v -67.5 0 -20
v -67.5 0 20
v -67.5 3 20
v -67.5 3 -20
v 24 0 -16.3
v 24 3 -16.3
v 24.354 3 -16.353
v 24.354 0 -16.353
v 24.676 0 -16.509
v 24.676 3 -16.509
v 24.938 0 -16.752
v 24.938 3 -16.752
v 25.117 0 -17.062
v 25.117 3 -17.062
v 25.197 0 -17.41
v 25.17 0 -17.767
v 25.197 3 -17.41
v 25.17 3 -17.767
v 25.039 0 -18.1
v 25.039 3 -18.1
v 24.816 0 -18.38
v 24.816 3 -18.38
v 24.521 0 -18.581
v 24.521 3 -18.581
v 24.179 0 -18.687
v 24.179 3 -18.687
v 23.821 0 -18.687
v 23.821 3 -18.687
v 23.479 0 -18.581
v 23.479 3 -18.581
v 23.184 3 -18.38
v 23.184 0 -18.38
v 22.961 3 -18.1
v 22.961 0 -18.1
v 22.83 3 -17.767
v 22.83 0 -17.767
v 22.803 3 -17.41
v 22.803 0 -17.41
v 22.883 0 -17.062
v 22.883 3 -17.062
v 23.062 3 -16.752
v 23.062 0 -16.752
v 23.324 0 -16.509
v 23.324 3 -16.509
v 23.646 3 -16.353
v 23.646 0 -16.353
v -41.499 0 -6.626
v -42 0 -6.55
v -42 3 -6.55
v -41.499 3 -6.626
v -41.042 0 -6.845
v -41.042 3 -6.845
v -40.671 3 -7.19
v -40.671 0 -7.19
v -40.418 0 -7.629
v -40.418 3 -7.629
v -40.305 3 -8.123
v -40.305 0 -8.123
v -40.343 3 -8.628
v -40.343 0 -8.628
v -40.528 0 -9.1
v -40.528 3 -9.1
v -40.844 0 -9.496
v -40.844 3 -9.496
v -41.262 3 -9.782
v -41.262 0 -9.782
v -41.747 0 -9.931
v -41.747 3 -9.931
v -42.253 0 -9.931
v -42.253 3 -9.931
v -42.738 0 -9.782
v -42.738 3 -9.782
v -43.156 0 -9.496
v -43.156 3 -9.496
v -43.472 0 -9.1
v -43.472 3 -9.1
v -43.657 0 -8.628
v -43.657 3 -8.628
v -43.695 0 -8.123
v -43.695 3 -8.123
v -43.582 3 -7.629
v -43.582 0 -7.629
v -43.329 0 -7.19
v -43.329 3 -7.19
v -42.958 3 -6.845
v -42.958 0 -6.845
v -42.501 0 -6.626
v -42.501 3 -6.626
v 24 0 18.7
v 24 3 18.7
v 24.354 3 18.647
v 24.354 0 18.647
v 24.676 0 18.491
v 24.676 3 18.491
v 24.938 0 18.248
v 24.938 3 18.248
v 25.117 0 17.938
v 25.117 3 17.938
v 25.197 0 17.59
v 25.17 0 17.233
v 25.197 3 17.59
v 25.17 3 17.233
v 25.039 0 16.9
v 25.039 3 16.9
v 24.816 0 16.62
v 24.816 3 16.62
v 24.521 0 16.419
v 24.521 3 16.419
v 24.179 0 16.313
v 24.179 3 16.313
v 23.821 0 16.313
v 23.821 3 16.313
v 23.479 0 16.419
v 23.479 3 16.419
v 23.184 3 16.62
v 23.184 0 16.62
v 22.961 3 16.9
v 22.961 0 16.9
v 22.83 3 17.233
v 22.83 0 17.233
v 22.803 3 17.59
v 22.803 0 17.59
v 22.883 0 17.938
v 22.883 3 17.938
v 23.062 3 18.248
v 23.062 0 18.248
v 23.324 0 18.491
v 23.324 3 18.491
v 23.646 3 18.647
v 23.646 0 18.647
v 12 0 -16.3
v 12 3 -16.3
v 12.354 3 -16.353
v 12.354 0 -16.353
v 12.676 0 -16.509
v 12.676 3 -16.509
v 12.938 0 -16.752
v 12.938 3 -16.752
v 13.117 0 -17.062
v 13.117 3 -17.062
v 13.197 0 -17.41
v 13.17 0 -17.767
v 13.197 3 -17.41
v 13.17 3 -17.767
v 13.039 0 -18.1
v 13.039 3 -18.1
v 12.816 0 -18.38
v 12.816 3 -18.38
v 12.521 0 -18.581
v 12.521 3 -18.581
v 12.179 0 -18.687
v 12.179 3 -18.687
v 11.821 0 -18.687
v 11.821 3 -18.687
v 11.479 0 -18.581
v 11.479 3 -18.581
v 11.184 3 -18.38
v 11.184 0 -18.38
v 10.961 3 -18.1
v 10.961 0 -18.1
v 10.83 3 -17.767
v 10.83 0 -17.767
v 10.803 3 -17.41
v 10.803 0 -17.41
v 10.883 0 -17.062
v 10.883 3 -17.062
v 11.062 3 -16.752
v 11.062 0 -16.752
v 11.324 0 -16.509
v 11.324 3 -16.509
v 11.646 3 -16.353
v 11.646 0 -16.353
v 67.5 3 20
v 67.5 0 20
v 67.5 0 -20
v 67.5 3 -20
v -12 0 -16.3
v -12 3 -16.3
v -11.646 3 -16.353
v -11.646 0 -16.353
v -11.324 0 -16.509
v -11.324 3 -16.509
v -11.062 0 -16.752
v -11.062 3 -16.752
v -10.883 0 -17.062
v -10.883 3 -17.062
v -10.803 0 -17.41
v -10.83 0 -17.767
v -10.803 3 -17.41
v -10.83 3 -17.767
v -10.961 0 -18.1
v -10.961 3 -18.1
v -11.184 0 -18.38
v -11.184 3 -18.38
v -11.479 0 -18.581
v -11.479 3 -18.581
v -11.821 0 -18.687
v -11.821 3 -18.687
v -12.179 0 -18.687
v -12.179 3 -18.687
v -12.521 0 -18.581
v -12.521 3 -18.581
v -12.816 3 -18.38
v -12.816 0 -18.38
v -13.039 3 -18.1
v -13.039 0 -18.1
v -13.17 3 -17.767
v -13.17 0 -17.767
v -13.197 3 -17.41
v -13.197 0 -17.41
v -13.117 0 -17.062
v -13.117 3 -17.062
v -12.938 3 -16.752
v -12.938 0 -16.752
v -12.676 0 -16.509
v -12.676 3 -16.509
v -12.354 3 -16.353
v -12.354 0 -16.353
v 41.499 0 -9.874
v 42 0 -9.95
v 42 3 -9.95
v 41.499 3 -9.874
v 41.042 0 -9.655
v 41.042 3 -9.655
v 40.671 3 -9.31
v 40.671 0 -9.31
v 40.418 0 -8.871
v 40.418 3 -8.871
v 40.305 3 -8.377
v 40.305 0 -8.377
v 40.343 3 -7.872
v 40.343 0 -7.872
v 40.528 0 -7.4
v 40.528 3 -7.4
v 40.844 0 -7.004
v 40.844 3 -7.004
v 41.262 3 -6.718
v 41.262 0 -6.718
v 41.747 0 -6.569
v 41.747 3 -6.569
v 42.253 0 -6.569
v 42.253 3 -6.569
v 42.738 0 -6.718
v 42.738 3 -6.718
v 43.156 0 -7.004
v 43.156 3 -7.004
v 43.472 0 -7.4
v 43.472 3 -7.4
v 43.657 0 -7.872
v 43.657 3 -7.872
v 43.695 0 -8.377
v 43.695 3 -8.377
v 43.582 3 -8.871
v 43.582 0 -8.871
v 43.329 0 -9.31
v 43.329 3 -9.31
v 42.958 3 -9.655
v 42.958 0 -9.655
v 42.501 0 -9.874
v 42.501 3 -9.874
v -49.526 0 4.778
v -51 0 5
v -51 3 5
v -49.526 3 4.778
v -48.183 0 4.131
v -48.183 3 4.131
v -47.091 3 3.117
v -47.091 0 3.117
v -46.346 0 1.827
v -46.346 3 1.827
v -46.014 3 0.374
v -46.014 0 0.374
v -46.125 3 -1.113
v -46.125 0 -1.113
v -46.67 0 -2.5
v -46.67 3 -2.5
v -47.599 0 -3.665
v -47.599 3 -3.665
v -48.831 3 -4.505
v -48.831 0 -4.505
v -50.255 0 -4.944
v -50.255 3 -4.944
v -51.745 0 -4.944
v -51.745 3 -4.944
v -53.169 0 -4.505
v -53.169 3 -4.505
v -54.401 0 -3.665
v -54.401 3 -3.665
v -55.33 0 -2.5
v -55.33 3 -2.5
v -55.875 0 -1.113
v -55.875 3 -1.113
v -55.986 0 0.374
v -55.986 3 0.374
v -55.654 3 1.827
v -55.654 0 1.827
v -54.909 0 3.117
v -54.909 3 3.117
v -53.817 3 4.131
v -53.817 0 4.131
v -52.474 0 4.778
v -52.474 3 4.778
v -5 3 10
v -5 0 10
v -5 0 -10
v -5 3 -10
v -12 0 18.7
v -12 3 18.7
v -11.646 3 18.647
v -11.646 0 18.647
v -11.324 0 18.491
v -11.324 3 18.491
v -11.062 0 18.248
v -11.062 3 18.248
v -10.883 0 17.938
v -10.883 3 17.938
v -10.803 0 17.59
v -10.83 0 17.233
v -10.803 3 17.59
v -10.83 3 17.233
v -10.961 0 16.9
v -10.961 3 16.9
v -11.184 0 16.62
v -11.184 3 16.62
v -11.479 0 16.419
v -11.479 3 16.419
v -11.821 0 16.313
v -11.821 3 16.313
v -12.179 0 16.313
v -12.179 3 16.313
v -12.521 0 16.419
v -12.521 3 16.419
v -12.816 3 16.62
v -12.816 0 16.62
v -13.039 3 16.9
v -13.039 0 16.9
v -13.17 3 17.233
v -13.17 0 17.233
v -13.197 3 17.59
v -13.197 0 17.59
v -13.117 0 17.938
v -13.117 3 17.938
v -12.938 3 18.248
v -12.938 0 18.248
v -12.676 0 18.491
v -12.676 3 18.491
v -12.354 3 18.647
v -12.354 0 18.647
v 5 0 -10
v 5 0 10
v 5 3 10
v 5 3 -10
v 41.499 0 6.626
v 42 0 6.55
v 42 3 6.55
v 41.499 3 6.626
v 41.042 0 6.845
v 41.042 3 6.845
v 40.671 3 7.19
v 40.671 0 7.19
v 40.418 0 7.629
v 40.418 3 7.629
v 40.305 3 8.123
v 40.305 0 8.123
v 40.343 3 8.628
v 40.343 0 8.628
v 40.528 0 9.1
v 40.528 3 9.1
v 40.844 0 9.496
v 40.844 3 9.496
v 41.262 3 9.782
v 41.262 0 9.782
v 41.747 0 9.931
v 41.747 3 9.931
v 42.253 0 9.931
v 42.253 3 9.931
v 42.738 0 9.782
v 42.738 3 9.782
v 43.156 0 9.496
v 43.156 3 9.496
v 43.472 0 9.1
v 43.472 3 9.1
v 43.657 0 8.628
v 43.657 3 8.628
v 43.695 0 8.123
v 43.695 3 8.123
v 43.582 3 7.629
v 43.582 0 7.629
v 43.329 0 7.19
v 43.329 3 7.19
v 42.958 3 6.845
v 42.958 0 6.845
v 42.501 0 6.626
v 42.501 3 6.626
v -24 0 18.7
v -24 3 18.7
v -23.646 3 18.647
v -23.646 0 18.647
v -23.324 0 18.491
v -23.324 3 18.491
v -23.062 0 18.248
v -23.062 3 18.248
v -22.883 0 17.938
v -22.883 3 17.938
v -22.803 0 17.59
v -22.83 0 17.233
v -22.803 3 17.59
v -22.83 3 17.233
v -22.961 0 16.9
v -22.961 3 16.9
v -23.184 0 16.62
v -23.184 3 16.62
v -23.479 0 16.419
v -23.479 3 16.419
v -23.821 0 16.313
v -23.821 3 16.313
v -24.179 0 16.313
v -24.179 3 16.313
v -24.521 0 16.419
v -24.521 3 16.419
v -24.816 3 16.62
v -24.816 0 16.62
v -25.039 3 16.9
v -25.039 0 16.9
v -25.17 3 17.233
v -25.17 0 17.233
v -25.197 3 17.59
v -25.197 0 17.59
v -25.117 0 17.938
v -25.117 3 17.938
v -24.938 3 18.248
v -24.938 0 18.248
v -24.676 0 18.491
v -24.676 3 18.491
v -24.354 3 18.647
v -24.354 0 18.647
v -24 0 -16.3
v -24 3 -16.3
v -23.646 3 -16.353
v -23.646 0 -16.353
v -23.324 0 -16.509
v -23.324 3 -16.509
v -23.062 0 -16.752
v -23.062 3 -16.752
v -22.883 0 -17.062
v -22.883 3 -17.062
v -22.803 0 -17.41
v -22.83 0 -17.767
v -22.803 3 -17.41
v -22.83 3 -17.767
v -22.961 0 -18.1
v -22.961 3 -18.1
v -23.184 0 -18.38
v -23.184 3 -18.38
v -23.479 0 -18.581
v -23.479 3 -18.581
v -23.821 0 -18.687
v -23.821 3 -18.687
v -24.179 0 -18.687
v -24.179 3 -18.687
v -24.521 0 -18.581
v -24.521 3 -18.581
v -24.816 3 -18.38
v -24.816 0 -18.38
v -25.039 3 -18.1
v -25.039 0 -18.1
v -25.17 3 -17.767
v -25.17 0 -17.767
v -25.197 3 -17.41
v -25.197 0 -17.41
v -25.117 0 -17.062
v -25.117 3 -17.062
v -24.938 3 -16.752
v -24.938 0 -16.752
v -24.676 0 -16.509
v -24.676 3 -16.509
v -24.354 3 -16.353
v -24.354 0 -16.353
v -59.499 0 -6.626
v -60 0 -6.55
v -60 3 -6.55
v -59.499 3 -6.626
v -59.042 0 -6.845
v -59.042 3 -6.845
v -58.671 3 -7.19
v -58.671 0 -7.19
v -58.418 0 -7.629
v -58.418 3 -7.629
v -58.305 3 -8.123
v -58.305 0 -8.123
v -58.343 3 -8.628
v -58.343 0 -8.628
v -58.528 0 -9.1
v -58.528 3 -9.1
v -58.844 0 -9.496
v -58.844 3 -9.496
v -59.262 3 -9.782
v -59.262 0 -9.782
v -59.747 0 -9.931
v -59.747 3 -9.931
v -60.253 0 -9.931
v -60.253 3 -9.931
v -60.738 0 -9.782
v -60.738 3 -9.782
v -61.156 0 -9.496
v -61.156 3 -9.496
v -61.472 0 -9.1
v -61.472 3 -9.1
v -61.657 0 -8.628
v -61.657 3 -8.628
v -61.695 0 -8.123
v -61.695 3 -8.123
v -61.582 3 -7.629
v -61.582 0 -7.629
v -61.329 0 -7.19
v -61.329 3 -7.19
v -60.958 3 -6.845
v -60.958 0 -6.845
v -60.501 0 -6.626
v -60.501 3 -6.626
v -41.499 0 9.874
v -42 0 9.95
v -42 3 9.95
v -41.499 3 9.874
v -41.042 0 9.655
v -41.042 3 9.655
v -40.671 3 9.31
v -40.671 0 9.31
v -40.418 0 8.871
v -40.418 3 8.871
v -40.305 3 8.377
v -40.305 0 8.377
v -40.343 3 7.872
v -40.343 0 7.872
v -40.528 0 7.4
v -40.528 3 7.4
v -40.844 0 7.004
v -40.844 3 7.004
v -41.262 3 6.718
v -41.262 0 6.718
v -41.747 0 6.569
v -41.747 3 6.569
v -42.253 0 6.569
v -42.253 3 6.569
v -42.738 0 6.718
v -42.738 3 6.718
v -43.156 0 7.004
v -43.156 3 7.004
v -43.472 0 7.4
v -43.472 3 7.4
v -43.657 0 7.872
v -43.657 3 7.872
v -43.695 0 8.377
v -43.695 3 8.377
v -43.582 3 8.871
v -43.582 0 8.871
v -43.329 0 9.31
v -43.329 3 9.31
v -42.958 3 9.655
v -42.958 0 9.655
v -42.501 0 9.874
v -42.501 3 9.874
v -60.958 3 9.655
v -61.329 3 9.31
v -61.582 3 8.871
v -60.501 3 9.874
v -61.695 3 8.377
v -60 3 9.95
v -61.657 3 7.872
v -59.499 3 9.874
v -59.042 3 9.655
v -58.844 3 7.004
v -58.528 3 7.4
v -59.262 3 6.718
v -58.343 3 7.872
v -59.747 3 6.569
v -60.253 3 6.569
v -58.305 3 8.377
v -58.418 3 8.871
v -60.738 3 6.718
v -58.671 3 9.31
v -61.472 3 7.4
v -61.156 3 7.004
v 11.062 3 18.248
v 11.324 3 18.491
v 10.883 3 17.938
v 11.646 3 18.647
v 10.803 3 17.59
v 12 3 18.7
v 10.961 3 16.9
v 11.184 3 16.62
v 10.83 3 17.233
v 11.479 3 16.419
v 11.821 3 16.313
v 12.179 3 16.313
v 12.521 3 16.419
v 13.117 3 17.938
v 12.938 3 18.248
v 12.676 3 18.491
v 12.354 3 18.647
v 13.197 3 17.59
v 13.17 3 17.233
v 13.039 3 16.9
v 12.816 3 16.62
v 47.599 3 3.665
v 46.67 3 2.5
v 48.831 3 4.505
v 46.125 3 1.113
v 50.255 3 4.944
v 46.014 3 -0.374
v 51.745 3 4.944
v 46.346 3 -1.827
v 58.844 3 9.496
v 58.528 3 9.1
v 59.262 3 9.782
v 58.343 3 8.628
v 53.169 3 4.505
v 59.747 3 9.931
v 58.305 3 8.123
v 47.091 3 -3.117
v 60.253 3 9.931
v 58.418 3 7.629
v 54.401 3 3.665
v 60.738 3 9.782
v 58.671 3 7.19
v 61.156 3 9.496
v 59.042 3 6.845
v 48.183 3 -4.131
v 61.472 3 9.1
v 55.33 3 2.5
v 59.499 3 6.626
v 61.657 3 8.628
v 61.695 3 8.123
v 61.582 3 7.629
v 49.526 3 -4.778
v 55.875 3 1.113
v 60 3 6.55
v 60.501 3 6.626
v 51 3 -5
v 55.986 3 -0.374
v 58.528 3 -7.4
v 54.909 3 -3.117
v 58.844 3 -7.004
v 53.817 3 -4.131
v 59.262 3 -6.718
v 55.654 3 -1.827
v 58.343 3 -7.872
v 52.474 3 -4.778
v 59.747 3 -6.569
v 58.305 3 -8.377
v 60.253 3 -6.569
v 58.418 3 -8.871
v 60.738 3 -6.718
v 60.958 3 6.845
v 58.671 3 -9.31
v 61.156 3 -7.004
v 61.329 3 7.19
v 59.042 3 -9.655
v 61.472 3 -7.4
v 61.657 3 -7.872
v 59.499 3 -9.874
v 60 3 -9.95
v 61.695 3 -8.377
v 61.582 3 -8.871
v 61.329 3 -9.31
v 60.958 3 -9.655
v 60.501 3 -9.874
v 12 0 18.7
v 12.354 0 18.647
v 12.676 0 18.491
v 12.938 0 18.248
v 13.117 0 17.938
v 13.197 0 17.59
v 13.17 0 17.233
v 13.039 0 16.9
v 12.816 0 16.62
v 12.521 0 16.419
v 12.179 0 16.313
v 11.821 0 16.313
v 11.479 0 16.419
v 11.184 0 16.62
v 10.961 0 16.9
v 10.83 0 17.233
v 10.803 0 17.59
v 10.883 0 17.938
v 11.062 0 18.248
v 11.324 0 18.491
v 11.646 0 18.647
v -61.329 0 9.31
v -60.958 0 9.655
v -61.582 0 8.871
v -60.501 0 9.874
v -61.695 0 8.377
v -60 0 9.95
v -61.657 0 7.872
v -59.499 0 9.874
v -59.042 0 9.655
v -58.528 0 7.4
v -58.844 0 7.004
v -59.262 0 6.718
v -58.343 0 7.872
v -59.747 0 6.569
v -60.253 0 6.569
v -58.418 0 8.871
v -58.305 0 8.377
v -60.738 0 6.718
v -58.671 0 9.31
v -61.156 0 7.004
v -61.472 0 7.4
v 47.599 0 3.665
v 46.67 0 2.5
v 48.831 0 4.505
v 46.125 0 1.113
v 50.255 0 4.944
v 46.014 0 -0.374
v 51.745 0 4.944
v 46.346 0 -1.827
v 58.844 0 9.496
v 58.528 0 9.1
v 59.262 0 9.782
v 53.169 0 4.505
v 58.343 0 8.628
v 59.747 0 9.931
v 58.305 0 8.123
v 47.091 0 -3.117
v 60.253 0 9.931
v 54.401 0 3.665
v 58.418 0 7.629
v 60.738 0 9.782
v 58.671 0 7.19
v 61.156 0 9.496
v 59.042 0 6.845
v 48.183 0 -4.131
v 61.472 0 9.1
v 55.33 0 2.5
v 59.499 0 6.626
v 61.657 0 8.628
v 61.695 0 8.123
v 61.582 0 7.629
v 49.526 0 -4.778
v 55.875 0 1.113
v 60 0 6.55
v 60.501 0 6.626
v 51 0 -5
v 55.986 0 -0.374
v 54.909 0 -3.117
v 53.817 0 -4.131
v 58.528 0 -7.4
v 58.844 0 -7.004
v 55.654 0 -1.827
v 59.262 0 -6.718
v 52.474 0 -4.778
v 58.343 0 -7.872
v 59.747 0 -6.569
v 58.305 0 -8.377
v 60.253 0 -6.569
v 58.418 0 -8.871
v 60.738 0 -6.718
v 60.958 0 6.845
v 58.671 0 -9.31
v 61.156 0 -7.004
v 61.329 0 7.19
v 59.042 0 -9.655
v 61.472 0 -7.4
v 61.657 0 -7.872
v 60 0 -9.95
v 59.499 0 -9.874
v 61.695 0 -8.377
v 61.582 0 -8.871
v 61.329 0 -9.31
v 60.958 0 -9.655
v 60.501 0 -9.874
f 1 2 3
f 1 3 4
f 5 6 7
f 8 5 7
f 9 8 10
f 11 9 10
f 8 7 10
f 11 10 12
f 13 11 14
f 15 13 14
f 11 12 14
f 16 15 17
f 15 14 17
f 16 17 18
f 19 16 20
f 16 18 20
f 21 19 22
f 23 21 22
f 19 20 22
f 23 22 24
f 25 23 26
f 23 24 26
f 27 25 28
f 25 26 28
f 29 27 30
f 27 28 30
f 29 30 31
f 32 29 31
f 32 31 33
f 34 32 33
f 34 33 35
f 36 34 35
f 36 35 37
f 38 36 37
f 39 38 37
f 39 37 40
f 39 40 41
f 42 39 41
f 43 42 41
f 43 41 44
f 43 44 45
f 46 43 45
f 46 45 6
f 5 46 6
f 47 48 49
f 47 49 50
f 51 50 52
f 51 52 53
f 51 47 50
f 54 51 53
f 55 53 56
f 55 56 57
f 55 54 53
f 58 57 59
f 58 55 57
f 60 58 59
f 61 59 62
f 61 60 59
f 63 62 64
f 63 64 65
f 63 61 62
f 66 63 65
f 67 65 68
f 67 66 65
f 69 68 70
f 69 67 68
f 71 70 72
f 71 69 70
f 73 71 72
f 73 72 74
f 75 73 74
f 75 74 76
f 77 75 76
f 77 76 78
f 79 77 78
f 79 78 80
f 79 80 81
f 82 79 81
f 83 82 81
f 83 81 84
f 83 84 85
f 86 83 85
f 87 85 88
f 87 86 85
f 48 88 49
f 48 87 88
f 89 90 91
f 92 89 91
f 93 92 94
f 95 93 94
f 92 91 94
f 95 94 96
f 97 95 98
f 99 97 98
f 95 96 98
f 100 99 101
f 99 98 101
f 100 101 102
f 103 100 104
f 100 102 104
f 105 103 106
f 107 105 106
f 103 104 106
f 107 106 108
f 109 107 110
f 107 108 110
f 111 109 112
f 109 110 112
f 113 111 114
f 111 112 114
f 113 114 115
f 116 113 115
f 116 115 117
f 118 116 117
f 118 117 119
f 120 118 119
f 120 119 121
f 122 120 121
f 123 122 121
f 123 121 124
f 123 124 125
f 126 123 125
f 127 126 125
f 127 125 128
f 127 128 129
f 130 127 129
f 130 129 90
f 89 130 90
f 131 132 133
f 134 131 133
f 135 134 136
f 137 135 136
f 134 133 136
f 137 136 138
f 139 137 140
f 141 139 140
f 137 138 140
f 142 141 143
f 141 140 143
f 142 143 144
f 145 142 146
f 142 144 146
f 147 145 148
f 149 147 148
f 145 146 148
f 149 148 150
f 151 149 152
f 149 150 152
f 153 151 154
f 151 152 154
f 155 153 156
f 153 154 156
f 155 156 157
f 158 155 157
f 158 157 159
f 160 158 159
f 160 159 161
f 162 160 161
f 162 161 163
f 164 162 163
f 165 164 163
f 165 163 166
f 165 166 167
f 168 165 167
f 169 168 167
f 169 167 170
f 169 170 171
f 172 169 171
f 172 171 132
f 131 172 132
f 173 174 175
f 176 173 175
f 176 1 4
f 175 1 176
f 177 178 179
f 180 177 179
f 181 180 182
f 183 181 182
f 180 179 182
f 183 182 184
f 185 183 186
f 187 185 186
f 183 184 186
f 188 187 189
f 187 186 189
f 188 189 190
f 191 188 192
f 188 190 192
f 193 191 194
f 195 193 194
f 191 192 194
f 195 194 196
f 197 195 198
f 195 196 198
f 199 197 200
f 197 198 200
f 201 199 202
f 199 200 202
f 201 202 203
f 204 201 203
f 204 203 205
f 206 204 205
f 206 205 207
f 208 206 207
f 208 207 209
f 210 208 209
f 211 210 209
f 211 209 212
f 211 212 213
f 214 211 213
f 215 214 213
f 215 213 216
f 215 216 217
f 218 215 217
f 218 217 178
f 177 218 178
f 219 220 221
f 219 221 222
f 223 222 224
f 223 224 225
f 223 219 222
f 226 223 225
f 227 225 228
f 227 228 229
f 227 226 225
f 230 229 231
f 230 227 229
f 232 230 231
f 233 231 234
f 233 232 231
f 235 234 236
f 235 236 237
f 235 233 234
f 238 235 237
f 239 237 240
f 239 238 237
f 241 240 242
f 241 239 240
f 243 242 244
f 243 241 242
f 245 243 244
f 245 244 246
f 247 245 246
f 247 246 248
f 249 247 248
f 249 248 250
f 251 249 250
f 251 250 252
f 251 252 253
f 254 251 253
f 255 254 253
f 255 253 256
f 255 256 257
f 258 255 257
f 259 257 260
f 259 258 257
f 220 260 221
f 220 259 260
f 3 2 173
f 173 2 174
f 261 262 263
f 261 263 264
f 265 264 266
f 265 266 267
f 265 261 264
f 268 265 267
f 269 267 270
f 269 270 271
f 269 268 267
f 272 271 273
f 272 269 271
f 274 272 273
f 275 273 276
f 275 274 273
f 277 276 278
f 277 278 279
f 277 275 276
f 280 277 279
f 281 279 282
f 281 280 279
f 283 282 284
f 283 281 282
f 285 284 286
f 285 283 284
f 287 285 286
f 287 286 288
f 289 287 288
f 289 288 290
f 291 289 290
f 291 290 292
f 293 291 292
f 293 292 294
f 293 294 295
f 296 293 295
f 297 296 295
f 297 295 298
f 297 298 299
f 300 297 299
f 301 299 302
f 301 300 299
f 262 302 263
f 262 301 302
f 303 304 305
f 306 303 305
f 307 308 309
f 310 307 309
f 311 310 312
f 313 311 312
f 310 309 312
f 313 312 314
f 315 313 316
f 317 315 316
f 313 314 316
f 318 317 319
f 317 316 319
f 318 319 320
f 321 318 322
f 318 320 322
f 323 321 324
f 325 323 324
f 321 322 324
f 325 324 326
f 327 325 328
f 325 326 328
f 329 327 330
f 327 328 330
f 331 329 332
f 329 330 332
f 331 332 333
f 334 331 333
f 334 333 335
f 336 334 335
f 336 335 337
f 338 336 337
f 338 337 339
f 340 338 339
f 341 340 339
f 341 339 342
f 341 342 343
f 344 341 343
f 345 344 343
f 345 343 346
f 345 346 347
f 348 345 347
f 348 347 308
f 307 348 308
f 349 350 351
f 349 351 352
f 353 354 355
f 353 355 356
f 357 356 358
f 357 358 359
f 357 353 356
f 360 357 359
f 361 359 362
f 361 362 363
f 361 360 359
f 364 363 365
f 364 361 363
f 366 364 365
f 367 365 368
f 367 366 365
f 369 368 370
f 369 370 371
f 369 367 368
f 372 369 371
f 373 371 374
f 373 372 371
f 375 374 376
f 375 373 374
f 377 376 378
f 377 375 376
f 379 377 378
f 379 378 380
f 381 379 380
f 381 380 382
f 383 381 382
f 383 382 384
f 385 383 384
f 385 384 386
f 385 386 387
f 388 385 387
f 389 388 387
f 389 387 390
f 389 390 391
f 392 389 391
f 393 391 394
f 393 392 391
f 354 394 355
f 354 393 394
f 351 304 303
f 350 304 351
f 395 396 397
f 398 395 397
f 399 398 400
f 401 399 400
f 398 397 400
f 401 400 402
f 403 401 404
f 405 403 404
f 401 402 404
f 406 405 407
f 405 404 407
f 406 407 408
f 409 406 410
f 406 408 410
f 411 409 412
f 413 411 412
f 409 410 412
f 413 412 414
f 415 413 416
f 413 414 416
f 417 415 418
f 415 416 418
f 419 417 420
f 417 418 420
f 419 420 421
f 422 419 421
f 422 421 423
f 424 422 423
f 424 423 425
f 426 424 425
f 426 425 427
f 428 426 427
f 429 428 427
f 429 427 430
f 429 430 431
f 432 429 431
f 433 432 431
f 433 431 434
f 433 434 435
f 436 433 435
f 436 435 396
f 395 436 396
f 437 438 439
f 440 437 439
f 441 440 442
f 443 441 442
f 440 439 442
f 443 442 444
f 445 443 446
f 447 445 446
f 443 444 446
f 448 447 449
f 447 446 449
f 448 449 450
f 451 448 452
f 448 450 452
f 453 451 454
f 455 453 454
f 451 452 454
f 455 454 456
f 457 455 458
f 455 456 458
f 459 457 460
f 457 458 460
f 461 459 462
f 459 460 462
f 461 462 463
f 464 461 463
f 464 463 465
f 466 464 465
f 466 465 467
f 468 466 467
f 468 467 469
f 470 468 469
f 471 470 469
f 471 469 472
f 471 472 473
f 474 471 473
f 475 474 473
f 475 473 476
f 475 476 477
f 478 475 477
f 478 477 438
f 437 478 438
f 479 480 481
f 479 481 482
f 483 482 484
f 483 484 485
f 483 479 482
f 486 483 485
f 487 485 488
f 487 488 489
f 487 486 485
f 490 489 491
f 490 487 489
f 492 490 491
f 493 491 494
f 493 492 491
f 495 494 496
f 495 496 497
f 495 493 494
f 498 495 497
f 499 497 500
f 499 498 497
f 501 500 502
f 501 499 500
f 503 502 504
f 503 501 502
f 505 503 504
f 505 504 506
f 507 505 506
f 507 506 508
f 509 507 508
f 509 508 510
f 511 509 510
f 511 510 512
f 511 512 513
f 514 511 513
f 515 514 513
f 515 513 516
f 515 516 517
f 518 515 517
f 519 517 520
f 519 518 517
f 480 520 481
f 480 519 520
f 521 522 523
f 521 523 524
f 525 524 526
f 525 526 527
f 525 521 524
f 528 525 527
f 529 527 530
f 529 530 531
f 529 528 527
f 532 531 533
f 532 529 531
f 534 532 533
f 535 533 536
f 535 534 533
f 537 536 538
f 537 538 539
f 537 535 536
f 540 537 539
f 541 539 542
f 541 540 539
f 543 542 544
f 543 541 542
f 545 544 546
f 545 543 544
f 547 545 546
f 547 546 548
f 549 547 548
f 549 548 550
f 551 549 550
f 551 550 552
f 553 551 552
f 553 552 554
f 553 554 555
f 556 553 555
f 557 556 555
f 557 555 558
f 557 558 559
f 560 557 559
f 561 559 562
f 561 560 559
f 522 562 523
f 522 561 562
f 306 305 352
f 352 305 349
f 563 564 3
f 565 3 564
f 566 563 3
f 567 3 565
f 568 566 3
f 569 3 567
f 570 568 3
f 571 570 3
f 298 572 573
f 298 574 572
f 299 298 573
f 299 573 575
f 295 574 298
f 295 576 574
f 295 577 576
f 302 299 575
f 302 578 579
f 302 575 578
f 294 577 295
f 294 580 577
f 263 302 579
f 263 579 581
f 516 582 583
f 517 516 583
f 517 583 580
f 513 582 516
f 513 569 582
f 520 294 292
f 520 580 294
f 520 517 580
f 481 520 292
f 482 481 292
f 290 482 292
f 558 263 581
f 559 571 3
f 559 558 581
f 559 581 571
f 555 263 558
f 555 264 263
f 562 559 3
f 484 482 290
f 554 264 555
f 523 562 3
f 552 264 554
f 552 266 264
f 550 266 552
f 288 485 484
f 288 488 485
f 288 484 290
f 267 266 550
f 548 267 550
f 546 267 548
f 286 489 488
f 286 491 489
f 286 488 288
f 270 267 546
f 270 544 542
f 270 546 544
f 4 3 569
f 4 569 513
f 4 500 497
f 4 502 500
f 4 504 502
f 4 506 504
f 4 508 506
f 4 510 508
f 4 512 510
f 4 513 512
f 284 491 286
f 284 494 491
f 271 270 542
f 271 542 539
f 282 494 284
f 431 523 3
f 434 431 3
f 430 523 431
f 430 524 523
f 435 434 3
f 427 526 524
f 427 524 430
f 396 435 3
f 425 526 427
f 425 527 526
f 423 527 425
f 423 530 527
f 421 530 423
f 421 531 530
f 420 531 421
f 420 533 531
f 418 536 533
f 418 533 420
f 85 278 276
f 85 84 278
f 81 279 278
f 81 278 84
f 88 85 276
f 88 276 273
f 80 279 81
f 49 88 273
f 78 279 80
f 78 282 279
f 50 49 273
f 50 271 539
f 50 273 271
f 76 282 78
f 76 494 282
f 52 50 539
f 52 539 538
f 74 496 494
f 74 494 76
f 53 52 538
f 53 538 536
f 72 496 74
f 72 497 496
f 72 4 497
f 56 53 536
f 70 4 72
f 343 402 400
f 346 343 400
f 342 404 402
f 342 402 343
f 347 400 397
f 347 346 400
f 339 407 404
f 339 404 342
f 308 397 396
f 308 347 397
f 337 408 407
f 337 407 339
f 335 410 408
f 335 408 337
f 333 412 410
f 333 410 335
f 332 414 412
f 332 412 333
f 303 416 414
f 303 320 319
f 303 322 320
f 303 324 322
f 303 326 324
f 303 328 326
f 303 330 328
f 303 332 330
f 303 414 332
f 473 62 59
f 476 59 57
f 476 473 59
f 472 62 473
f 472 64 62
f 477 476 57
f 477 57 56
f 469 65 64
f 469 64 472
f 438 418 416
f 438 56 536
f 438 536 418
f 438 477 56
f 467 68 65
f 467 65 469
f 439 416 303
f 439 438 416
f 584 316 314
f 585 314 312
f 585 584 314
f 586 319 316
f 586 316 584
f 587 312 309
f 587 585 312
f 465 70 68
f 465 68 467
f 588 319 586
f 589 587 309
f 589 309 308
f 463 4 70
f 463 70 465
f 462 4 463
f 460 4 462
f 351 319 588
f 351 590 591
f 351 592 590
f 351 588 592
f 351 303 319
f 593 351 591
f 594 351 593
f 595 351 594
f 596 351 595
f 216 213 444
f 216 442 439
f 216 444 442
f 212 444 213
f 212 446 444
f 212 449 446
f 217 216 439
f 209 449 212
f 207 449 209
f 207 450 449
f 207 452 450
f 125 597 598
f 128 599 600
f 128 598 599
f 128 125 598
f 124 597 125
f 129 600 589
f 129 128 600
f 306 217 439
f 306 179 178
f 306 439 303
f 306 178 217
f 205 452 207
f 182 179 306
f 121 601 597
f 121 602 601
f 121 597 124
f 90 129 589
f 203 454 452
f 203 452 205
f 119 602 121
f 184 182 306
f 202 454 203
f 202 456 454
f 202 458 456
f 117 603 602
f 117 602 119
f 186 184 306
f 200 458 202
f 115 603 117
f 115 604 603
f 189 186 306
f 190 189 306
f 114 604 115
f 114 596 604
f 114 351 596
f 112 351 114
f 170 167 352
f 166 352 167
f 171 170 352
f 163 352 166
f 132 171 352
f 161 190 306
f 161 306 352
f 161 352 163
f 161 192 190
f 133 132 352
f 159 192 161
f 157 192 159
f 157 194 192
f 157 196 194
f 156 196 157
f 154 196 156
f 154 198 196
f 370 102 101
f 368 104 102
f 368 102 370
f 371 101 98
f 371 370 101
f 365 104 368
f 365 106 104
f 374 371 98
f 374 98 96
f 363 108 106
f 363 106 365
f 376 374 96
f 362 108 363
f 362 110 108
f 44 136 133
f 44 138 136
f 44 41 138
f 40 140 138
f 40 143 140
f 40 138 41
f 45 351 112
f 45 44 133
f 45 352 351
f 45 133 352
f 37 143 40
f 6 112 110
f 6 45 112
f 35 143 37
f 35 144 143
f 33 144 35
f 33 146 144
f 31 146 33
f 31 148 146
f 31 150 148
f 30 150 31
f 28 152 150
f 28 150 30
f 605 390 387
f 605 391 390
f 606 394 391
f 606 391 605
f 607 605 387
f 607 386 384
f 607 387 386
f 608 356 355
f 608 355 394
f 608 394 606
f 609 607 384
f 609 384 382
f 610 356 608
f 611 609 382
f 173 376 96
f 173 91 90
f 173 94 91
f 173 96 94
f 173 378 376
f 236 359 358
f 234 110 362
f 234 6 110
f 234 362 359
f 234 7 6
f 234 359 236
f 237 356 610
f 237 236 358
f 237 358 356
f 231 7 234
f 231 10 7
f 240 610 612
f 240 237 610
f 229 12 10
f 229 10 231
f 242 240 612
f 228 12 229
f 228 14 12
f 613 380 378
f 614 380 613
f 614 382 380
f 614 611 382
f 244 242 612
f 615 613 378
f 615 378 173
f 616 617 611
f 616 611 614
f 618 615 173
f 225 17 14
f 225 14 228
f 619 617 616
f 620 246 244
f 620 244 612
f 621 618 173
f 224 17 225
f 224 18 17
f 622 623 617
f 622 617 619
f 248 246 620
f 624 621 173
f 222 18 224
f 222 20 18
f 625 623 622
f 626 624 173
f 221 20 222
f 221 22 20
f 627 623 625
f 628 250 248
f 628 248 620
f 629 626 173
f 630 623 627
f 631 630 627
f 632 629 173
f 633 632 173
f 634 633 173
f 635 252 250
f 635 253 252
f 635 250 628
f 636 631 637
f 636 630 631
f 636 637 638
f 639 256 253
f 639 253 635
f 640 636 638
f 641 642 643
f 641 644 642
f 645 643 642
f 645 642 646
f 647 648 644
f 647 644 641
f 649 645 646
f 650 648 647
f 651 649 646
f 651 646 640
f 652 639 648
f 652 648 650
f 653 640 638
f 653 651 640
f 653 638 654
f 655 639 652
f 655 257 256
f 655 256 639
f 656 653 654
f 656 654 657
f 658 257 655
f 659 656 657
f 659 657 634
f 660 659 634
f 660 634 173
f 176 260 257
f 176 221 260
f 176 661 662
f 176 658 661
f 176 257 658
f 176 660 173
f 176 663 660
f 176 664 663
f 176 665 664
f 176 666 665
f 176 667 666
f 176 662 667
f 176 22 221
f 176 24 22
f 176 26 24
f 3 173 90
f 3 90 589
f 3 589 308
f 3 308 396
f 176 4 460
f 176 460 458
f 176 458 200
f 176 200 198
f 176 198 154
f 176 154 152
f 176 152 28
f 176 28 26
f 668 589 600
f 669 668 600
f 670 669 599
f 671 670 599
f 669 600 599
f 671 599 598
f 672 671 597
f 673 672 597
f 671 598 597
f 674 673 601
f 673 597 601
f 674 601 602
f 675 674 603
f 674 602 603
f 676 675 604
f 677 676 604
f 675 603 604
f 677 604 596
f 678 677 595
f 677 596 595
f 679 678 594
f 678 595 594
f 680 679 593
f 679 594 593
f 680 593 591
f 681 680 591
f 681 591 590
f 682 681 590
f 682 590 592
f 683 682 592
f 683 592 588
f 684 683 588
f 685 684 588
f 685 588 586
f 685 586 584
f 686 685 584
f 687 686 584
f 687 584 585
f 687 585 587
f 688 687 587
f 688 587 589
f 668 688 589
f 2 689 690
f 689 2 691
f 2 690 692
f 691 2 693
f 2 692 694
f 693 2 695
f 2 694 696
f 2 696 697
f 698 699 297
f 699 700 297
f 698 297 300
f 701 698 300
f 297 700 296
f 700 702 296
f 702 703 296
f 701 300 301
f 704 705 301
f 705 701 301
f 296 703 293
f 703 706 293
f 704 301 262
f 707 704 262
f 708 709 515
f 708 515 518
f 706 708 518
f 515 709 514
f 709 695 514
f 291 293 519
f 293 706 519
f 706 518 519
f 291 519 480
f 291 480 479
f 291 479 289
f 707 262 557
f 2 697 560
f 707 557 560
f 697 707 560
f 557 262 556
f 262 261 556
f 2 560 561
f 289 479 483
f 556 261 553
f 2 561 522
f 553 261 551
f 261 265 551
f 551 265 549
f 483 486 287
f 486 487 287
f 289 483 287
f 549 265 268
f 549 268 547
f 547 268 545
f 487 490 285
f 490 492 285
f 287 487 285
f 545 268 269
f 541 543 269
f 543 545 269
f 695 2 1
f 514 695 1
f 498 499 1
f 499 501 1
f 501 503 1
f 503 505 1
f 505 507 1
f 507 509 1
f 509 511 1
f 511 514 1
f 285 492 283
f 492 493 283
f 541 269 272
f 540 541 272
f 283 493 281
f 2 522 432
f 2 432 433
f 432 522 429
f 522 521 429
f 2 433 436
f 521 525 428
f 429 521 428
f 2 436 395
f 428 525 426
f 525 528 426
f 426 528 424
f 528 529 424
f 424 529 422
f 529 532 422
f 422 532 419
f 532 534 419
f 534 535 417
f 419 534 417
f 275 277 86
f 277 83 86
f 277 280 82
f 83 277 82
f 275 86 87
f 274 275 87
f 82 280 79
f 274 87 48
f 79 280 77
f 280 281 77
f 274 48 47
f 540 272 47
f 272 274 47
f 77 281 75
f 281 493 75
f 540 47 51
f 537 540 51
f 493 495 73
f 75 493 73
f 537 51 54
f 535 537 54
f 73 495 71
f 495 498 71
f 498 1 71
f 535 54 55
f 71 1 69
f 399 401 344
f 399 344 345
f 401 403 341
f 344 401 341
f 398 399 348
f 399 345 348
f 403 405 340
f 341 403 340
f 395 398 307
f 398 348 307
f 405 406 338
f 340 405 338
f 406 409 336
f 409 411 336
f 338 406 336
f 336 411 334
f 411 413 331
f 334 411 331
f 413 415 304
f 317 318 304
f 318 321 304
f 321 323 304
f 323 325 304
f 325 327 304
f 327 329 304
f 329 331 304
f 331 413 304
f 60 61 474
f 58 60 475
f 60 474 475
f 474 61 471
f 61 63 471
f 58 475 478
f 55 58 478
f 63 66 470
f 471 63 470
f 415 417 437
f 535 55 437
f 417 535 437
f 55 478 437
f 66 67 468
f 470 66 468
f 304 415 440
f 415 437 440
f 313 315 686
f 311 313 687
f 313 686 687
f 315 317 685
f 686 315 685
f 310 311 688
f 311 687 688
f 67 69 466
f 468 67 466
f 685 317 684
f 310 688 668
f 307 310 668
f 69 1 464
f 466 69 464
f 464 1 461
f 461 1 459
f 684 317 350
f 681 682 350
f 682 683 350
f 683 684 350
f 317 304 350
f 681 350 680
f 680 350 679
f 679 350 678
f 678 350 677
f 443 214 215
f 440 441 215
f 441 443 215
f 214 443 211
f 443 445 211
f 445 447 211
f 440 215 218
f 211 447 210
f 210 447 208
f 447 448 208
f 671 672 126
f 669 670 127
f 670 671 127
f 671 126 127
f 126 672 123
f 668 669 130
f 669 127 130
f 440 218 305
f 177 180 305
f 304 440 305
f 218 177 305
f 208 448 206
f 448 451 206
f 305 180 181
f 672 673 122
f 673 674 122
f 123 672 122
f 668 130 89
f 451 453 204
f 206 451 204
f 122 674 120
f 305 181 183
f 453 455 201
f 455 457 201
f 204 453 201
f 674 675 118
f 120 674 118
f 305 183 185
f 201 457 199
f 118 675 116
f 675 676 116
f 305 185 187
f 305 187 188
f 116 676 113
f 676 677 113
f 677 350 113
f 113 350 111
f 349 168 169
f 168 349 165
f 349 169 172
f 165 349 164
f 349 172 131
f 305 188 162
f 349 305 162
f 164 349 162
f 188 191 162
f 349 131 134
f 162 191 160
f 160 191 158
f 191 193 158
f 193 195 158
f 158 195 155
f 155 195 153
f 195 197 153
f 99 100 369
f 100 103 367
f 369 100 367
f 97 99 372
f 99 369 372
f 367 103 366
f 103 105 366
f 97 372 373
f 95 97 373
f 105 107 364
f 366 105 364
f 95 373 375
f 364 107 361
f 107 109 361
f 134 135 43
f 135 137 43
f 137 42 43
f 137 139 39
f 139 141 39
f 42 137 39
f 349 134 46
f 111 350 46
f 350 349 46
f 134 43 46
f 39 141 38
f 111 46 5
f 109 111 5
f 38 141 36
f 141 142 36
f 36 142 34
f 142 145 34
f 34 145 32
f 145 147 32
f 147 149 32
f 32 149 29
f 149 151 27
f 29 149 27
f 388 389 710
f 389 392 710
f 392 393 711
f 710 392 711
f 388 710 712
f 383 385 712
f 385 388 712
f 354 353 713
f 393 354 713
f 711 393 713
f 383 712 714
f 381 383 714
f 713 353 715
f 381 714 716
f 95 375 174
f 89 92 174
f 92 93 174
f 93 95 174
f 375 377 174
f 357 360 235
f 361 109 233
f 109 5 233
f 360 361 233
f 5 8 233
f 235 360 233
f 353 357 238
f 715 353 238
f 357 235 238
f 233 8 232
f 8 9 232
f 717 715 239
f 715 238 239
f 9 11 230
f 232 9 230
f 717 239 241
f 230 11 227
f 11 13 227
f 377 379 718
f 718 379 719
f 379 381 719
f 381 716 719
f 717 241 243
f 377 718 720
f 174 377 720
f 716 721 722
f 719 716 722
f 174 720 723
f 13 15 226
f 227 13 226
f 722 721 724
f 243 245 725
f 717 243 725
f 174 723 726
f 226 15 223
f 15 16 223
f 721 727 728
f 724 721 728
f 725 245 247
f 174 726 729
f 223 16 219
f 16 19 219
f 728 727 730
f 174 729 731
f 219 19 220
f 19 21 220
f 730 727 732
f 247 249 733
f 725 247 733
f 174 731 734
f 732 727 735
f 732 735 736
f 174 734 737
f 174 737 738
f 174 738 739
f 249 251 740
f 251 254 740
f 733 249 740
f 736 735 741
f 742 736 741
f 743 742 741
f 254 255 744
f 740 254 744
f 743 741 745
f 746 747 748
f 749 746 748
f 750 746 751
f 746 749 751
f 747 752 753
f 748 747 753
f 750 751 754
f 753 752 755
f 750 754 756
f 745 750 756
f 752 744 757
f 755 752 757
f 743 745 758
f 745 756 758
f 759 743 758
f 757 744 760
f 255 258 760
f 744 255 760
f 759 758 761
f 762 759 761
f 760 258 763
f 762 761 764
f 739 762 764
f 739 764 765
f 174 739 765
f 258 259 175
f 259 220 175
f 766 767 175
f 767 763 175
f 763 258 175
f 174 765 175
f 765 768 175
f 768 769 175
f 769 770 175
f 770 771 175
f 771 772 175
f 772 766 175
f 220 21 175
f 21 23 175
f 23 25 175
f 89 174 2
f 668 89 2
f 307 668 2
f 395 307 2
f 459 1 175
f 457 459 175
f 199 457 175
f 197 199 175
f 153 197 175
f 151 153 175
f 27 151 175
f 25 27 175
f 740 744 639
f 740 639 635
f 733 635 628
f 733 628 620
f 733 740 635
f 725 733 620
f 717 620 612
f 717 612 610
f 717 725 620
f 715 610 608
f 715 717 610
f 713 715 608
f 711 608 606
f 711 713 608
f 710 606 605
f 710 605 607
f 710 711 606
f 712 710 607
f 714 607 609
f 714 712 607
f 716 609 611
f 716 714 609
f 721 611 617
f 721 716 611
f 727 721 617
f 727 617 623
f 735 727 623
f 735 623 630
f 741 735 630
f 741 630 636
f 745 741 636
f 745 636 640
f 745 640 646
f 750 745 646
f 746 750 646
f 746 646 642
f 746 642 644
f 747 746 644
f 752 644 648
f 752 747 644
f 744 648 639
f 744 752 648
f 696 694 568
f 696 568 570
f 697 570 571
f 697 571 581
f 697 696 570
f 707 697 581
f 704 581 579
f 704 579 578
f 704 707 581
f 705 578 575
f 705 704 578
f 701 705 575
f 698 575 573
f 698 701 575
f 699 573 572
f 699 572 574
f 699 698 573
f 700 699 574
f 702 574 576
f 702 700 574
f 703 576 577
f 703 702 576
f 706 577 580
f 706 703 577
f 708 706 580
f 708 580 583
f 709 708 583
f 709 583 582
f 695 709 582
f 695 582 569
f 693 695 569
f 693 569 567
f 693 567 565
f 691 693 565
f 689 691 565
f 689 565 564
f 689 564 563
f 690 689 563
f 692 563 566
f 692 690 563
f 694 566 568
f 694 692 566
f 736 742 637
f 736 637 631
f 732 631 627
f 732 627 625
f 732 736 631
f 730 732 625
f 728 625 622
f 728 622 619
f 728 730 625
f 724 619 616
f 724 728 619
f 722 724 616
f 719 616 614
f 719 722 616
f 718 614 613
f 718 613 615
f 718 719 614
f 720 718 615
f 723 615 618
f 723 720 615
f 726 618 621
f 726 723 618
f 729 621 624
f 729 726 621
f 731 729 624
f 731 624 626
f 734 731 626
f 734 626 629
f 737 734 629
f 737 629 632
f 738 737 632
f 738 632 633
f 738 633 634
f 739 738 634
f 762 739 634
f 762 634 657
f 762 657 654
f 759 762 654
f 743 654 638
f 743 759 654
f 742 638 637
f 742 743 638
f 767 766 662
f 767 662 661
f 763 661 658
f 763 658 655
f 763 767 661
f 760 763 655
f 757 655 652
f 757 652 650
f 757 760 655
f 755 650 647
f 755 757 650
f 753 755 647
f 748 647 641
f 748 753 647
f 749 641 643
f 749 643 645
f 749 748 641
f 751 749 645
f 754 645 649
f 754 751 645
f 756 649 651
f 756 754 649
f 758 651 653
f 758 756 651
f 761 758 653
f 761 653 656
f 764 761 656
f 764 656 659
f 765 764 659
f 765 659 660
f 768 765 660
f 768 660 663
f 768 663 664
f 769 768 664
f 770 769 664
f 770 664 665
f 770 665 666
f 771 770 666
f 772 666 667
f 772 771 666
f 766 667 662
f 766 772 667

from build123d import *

# Parameters (mm, degrees)
SKETCH1_W           = 135
SKETCH1_H           = 40
SKETCH1_R           = 5
SKETCH1_R_2         = 1.7
SKETCH1_W_2         = 10
SKETCH1_H_2         = 20
BOSS_EXTRUDE1_DEPTH = 3
SKETCH3_R           = 1.2
CUT_EXTRUDE1_DEPTH  = 10


with BuildPart() as part:
    # Sketch1 → Boss-Extrude1 (new body)
    with BuildSketch(Plane(origin=(0, 0, 0), x_dir=(1, 0, 0), z_dir=(0, 1, 0))):
        Rectangle(SKETCH1_W, SKETCH1_H)
        with Locations(Location((-51, 0, 0), (0, 0, 270))):
            Circle(SKETCH1_R, mode=Mode.SUBTRACT)
        with Locations(Location((-60, 8.25, 0), (0, 0, 270))):
            Circle(SKETCH1_R_2, mode=Mode.SUBTRACT)
        with Locations(Location((-42, 8.25, 0), (0, 0, 270))):
            Circle(SKETCH1_R_2, mode=Mode.SUBTRACT)
        with Locations(Location((-42, -8.25, 0), (0, 0, 270))):
            Circle(SKETCH1_R_2, mode=Mode.SUBTRACT)
        with Locations(Location((-60, -8.25, 0), (0, 0, 270))):
            Circle(SKETCH1_R_2, mode=Mode.SUBTRACT)
        with Locations(Location((51, 0, 0), (0, 0, 90))):
            Circle(SKETCH1_R, mode=Mode.SUBTRACT)
        with Locations(Location((42, 8.25, 0), (0, 0, 90))):
            Circle(SKETCH1_R_2, mode=Mode.SUBTRACT)
        with Locations(Location((42, -8.25, 0), (0, 0, 90))):
            Circle(SKETCH1_R_2, mode=Mode.SUBTRACT)
        with Locations(Location((60, -8.25, 0), (0, 0, 90))):
            Circle(SKETCH1_R_2, mode=Mode.SUBTRACT)
        with Locations(Location((60, 8.25, 0), (0, 0, 90))):
            Circle(SKETCH1_R_2, mode=Mode.SUBTRACT)
        Rectangle(SKETCH1_W_2, SKETCH1_H_2, mode=Mode.SUBTRACT)
    extrude(amount=BOSS_EXTRUDE1_DEPTH)

    # Sketch3 → Cut-Extrude1 (cut)
    with BuildSketch(Plane(origin=(0, 3, 0), x_dir=(1, 0, 0), z_dir=(0, 1, 0))):
        with Locations(Location((-12, 17.5, 0), (0, 0, 270))):
            Circle(SKETCH3_R)
        with Locations(Location((-12, -17.5, 0), (0, 0, 270))):
            Circle(SKETCH3_R)
        with Locations(Location((-24, 17.5, 0), (0, 0, 270))):
            Circle(SKETCH3_R)
        with Locations(Location((-24, -17.5, 0), (0, 0, 270))):
            Circle(SKETCH3_R)
        with Locations(Location((24, -17.5, 0), (0, 0, 270))):
            Circle(SKETCH3_R)
        with Locations(Location((24, 17.5, 0), (0, 0, 270))):
            Circle(SKETCH3_R)
        with Locations(Location((12, -17.5, 0), (0, 0, 270))):
            Circle(SKETCH3_R)
        with Locations(Location((12, 17.5, 0), (0, 0, 270))):
            Circle(SKETCH3_R)
    extrude(amount=-CUT_EXTRUDE1_DEPTH, mode=Mode.SUBTRACT)


solid = part.part
